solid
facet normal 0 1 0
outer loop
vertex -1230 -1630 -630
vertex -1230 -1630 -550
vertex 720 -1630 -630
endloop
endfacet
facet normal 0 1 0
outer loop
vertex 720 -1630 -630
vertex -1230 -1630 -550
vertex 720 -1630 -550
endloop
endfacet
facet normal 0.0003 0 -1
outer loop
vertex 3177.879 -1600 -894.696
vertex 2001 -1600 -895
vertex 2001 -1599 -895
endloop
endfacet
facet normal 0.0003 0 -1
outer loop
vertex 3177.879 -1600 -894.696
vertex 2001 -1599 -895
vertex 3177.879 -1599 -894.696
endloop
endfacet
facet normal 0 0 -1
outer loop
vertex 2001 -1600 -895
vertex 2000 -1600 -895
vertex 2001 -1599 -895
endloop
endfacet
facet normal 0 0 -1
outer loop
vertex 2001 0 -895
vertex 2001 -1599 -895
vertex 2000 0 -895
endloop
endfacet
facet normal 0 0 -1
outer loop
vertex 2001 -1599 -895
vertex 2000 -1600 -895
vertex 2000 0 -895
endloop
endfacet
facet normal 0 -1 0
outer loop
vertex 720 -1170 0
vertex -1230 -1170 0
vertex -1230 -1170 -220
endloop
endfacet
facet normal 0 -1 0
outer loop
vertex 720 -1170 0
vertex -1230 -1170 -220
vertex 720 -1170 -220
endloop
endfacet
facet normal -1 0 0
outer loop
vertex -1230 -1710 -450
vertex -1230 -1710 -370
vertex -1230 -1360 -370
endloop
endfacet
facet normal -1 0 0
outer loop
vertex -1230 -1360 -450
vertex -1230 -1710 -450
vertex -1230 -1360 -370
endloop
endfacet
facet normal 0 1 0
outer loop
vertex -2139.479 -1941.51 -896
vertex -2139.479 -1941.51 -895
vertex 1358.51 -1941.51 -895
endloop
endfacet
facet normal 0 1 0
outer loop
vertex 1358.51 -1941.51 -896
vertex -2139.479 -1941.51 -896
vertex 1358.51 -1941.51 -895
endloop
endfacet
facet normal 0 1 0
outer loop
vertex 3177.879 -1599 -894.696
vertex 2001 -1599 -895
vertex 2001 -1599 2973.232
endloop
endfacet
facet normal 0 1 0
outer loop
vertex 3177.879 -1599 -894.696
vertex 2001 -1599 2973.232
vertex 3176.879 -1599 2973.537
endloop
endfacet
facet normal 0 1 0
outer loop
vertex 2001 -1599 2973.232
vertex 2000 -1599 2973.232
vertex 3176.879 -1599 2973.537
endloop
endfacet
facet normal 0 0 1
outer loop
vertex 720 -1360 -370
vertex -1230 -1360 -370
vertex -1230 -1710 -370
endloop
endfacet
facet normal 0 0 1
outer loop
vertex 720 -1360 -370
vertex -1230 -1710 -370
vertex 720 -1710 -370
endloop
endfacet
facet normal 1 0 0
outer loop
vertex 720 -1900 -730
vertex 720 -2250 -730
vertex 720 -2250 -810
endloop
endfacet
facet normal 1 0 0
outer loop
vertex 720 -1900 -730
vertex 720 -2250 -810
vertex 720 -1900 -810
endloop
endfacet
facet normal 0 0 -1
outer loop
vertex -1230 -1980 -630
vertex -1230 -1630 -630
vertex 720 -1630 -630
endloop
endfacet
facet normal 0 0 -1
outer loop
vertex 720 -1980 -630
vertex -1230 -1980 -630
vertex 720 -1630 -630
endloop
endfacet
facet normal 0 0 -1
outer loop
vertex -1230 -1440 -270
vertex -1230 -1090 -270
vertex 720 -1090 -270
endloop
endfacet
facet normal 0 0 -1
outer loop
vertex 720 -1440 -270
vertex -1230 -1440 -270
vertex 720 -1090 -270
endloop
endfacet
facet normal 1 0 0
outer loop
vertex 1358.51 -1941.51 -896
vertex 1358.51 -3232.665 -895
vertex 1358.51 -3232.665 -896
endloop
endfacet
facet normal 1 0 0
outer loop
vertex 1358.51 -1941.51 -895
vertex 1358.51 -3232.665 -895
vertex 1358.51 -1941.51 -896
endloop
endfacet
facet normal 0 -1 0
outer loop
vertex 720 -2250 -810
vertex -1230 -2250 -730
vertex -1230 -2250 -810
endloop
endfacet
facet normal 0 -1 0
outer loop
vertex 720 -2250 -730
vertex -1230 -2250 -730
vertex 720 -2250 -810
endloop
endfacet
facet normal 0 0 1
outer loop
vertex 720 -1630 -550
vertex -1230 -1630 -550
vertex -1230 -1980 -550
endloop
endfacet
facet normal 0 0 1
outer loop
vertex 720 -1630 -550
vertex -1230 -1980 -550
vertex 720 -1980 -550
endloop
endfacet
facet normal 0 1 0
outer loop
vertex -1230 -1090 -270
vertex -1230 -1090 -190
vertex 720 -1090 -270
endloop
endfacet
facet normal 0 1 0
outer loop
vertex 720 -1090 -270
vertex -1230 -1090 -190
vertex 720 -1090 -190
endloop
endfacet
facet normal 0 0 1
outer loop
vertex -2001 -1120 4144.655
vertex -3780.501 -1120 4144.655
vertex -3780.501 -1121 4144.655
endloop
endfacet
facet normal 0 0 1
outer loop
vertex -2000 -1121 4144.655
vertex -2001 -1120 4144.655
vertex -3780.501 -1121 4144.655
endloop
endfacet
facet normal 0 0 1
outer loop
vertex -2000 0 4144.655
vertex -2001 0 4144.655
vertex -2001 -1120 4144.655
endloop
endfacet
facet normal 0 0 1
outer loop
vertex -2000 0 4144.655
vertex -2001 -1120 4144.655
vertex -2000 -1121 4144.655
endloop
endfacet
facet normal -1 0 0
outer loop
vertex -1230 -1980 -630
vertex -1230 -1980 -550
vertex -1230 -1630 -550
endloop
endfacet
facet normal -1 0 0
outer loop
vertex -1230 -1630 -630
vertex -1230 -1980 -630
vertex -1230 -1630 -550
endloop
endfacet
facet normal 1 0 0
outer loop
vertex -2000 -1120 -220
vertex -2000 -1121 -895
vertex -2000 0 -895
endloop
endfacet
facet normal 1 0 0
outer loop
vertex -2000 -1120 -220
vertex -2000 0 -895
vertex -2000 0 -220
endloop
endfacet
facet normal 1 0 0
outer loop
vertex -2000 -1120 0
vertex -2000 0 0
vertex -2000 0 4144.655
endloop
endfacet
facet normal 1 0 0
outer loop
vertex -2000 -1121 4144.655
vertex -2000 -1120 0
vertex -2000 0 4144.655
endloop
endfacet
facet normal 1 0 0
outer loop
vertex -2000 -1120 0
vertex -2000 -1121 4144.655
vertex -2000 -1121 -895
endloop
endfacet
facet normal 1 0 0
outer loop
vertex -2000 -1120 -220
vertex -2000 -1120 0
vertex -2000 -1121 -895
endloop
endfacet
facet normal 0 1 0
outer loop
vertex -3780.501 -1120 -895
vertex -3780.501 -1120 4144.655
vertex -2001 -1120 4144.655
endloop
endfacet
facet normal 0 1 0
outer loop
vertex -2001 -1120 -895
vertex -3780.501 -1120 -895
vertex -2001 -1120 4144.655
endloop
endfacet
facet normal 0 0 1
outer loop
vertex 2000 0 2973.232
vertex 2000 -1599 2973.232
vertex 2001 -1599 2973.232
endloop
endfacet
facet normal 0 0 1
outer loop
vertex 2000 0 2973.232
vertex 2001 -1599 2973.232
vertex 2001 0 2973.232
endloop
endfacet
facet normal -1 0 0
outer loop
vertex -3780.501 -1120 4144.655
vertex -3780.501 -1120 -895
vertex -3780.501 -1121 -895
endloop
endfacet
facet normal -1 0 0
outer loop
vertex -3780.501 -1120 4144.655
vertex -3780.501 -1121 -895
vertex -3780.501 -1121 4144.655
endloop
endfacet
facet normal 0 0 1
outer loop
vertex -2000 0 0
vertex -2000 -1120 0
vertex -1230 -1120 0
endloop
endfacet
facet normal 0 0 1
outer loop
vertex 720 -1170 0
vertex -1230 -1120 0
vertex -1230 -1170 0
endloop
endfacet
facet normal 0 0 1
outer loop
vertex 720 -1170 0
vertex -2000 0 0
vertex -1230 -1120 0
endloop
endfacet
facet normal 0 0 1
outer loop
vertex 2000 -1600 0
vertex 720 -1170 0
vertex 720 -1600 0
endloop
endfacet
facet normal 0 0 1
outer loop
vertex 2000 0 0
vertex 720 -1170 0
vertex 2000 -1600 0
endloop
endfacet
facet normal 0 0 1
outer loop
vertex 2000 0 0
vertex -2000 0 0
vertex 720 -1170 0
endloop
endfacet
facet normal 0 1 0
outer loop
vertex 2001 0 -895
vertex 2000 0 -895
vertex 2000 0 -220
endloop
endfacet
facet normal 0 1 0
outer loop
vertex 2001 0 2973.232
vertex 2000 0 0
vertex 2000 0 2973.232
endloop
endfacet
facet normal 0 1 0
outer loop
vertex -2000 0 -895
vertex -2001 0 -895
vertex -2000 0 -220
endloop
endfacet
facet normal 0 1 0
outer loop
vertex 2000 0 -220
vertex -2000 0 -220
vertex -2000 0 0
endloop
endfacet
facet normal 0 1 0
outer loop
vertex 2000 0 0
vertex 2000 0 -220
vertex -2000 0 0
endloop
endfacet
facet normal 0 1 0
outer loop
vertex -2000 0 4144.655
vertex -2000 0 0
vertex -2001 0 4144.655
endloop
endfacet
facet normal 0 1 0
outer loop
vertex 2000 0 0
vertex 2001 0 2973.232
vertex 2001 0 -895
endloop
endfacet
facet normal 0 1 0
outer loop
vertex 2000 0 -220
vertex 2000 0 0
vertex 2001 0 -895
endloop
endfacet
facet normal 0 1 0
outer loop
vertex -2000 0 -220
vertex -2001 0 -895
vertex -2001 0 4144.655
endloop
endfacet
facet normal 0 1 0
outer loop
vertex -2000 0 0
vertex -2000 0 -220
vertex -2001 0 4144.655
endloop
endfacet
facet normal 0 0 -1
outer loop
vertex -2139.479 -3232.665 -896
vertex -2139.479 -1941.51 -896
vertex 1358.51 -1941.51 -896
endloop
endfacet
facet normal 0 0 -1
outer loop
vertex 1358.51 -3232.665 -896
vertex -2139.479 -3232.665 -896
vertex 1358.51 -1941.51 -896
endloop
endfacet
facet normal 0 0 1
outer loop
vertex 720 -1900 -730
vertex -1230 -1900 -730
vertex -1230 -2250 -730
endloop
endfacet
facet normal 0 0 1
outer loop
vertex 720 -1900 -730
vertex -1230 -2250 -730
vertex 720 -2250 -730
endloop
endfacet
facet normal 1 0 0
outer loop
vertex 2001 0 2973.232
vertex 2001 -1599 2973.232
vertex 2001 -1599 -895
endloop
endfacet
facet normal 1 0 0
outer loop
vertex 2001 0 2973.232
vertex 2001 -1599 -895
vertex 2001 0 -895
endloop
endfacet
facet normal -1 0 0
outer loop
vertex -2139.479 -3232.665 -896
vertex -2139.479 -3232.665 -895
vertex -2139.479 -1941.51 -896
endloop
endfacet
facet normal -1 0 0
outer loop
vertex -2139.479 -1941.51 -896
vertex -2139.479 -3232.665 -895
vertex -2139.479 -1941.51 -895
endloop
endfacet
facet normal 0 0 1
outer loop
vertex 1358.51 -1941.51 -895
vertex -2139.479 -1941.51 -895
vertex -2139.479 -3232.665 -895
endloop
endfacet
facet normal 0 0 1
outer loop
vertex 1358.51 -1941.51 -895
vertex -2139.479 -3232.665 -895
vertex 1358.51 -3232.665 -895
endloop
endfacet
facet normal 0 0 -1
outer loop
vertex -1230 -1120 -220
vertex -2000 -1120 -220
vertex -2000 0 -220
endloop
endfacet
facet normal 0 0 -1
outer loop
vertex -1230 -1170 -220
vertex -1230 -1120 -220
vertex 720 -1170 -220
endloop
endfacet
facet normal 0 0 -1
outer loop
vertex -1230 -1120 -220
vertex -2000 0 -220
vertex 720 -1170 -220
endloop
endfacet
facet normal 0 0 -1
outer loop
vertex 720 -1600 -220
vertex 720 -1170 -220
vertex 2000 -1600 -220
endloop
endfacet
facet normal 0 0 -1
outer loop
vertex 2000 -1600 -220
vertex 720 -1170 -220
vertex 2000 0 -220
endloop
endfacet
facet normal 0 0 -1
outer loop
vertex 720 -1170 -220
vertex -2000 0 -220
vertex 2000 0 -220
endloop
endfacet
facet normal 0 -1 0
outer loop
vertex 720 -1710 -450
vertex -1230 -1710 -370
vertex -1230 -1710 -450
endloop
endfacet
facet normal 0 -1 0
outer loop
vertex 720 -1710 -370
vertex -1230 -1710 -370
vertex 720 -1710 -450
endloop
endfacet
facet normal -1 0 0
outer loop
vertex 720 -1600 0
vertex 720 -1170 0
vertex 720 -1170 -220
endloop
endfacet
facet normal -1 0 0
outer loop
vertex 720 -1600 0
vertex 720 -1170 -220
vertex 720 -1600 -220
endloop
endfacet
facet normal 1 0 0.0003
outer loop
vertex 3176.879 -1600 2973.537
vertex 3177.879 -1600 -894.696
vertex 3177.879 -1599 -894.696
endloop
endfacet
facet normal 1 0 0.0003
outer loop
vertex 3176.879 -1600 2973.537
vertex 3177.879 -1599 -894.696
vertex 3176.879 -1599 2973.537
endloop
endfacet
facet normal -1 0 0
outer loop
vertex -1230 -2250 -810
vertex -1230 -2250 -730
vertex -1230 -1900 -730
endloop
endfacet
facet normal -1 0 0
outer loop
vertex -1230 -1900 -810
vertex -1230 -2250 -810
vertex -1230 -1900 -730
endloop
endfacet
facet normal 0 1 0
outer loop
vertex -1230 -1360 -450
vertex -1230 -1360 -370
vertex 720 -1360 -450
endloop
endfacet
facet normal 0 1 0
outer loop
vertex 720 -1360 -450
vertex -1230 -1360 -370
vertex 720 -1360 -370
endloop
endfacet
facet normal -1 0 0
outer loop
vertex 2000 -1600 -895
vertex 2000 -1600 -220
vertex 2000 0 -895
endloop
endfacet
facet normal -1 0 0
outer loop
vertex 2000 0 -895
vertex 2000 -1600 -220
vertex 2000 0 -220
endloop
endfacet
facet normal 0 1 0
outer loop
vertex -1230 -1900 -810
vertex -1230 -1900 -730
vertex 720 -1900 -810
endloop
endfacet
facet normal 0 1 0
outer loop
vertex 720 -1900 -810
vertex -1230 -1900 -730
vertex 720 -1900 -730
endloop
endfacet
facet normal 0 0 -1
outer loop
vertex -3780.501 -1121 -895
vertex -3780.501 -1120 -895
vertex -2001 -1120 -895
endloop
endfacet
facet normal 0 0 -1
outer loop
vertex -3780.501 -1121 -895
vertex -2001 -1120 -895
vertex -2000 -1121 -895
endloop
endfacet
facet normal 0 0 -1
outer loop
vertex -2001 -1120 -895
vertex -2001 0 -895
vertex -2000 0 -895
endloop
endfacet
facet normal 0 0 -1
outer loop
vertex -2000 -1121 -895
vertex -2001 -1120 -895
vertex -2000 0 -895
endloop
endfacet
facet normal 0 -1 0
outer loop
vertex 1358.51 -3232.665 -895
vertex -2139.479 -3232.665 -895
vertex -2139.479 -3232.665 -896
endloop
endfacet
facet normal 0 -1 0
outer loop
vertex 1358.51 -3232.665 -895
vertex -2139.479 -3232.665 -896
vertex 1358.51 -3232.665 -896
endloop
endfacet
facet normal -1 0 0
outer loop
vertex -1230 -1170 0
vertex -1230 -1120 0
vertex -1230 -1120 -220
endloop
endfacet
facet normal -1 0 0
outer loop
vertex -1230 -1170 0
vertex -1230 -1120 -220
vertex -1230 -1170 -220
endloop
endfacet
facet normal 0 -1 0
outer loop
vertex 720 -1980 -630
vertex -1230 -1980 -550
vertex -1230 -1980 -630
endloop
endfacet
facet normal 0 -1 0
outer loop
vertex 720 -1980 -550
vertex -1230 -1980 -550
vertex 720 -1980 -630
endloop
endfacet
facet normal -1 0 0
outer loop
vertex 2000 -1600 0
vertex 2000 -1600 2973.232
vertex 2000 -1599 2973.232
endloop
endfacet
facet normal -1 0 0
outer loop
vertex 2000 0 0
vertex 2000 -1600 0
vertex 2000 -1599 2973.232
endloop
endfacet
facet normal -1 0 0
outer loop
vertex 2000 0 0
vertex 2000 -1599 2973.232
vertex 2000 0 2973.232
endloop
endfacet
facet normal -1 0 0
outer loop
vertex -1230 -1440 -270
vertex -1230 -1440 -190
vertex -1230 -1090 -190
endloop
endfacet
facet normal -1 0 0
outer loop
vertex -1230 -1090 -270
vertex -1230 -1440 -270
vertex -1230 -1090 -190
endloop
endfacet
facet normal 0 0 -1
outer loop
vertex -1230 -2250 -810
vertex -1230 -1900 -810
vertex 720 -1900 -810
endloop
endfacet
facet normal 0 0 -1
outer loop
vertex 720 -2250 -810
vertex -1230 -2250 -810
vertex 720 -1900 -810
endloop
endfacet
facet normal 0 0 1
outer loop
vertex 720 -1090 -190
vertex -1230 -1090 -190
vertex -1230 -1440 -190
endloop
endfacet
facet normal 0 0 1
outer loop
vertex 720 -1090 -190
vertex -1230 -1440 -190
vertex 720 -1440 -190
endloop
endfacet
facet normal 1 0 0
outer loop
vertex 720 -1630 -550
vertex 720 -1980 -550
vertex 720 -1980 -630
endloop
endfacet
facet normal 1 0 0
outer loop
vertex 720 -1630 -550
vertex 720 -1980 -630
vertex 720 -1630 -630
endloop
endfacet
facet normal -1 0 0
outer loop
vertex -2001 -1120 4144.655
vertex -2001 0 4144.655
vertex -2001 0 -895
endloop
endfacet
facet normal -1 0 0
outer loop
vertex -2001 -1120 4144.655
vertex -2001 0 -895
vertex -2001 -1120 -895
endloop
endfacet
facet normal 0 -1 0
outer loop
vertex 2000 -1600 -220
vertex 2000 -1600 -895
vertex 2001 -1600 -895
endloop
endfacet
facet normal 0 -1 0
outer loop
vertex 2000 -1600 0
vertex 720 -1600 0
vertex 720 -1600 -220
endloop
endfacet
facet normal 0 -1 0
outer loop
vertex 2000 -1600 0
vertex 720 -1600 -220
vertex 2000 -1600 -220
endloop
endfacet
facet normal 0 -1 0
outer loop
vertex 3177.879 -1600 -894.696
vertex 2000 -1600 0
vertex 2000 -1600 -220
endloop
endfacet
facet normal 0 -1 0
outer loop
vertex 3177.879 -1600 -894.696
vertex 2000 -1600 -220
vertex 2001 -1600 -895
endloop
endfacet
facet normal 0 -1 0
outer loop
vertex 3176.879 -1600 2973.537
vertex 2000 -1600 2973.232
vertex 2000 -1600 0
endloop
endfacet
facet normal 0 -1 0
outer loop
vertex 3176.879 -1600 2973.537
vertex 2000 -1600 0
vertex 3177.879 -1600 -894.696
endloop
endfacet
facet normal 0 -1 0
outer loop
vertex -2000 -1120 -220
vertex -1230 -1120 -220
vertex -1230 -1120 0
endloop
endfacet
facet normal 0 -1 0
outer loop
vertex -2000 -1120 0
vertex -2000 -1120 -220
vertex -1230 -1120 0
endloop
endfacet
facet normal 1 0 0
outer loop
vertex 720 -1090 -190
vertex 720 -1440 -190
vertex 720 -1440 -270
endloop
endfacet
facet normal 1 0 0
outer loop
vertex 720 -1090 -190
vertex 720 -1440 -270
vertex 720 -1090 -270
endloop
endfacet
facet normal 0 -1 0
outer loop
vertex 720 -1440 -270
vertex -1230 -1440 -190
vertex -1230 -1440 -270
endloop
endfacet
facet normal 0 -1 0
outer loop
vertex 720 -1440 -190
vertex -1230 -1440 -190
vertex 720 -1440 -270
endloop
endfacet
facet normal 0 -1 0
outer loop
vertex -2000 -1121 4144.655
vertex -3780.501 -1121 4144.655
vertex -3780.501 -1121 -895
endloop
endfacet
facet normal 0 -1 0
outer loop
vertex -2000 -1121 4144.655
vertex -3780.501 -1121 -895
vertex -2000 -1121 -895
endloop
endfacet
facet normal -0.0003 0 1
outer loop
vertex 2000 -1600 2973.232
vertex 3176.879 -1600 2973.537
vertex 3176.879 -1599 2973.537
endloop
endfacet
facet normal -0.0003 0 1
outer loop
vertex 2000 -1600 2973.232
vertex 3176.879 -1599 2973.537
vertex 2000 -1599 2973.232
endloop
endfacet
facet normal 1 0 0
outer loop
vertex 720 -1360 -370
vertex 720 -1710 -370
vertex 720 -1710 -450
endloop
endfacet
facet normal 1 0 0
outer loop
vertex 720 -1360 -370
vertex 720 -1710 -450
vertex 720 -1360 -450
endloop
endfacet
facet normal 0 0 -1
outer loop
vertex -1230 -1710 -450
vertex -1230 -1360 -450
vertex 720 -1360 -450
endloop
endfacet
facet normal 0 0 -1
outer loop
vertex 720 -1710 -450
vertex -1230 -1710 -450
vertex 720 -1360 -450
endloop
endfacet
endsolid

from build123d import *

# Parameters (mm, degrees)
F1_DEPTH  = 220
F7_W      = 1950
F7_H      = 350
F8_DEPTH  = 80
F9_W      = 1950
F9_H      = 350
F10_DEPTH = 80
F11_W     = 1950
F11_H     = 350
F12_DEPTH = 80
F13_W     = 1950
F13_H     = 350
F14_DEPTH = 80
F15_W     = 3497.9887008667
F15_H     = 1291.1554574966
F16_DEPTH = 1
F17_W     = 1120
F17_H     = 5039.6552276611
F18_DEPTH = 1
F19_W     = 1780.5008888245
F19_H     = 5039.6552276611
F20_DEPTH = 1
F21_W     = 1600
F21_H     = 3868.2322692871
F22_DEPTH = 1
F24_DEPTH = 1


with BuildPart() as f1:
    # F0 (on Top) → F1 (new body)
    with BuildSketch(Plane.XY):
        Polygon((2000, 0), (0, 0), (-2000, 0), (-2000, -1120), (-1230, -1120), (-1230, -1170), (720, -1170), (720, -1600), (2000, -1600), align=None)
    extrude(amount=-F1_DEPTH)

    # F17 (on face) → F18 (join)
    with BuildSketch(Plane(origin=(-2000, 0, 0), x_dir=(0, -1, 0), z_dir=(-1, 0, 0))):
        with Locations((560, 1624.8276138306)):
            Rectangle(F17_W, F17_H)
    extrude(amount=F18_DEPTH)

    # F19 (on face) → F20 (join)
    with BuildSketch(Plane.XZ.offset(1120)):
        with Locations((-2890.2504444122, 1624.8276138306)):
            Rectangle(F19_W, F19_H)
    extrude(amount=F20_DEPTH)

    # F21 (on face) → F22 (join)
    with BuildSketch(Plane.YZ.offset(2000)):
        with Locations((-800, 1039.1161346436)):
            Rectangle(F21_W, F21_H)
    extrude(amount=F22_DEPTH)

    # F23 (on face) → F24 (join)
    with BuildSketch(Plane.XZ.offset(1600)):
        Polygon((3176.8793387898, 2973.5365114465), (2000, 2973.2322692871), (2001, -895), (3177.8793387898, -894.6957578406), align=None)
    extrude(amount=-F24_DEPTH)


with BuildPart() as f8:
    # F7 (on offset) → F8 (new body)
    with BuildSketch(Plane.XY.offset(-190)):
        with Locations((-255, -1265)):
            Rectangle(F7_W, F7_H)
    extrude(amount=-F8_DEPTH)


with BuildPart() as f10:
    # F9 (on offset) → F10 (new body)
    with BuildSketch(Plane.XY.offset(-370)):
        with Locations((-255, -1535)):
            Rectangle(F9_W, F9_H)
    extrude(amount=-F10_DEPTH)


with BuildPart() as f12:
    # F11 (on offset) → F12 (new body)
    with BuildSketch(Plane.XY.offset(-550)):
        with Locations((-255, -1805)):
            Rectangle(F11_W, F11_H)
    extrude(amount=-F12_DEPTH)


with BuildPart() as f14:
    # F13 (on offset) → F14 (new body)
    with BuildSketch(Plane.XY.offset(-730)):
        with Locations((-255, -2075)):
            Rectangle(F13_W, F13_H)
    extrude(amount=-F14_DEPTH)


with BuildPart() as f16:
    # F15 (on offset) → F16 (new body)
    with BuildSketch(Plane.XY.offset(-895)):
        with Locations((-390.4845714569, -2587.0873332024)):
            Rectangle(F15_W, F15_H)
    extrude(amount=-F16_DEPTH)


solid = Compound([f1.part, f8.part, f10.part, f12.part, f14.part, f16.part])
